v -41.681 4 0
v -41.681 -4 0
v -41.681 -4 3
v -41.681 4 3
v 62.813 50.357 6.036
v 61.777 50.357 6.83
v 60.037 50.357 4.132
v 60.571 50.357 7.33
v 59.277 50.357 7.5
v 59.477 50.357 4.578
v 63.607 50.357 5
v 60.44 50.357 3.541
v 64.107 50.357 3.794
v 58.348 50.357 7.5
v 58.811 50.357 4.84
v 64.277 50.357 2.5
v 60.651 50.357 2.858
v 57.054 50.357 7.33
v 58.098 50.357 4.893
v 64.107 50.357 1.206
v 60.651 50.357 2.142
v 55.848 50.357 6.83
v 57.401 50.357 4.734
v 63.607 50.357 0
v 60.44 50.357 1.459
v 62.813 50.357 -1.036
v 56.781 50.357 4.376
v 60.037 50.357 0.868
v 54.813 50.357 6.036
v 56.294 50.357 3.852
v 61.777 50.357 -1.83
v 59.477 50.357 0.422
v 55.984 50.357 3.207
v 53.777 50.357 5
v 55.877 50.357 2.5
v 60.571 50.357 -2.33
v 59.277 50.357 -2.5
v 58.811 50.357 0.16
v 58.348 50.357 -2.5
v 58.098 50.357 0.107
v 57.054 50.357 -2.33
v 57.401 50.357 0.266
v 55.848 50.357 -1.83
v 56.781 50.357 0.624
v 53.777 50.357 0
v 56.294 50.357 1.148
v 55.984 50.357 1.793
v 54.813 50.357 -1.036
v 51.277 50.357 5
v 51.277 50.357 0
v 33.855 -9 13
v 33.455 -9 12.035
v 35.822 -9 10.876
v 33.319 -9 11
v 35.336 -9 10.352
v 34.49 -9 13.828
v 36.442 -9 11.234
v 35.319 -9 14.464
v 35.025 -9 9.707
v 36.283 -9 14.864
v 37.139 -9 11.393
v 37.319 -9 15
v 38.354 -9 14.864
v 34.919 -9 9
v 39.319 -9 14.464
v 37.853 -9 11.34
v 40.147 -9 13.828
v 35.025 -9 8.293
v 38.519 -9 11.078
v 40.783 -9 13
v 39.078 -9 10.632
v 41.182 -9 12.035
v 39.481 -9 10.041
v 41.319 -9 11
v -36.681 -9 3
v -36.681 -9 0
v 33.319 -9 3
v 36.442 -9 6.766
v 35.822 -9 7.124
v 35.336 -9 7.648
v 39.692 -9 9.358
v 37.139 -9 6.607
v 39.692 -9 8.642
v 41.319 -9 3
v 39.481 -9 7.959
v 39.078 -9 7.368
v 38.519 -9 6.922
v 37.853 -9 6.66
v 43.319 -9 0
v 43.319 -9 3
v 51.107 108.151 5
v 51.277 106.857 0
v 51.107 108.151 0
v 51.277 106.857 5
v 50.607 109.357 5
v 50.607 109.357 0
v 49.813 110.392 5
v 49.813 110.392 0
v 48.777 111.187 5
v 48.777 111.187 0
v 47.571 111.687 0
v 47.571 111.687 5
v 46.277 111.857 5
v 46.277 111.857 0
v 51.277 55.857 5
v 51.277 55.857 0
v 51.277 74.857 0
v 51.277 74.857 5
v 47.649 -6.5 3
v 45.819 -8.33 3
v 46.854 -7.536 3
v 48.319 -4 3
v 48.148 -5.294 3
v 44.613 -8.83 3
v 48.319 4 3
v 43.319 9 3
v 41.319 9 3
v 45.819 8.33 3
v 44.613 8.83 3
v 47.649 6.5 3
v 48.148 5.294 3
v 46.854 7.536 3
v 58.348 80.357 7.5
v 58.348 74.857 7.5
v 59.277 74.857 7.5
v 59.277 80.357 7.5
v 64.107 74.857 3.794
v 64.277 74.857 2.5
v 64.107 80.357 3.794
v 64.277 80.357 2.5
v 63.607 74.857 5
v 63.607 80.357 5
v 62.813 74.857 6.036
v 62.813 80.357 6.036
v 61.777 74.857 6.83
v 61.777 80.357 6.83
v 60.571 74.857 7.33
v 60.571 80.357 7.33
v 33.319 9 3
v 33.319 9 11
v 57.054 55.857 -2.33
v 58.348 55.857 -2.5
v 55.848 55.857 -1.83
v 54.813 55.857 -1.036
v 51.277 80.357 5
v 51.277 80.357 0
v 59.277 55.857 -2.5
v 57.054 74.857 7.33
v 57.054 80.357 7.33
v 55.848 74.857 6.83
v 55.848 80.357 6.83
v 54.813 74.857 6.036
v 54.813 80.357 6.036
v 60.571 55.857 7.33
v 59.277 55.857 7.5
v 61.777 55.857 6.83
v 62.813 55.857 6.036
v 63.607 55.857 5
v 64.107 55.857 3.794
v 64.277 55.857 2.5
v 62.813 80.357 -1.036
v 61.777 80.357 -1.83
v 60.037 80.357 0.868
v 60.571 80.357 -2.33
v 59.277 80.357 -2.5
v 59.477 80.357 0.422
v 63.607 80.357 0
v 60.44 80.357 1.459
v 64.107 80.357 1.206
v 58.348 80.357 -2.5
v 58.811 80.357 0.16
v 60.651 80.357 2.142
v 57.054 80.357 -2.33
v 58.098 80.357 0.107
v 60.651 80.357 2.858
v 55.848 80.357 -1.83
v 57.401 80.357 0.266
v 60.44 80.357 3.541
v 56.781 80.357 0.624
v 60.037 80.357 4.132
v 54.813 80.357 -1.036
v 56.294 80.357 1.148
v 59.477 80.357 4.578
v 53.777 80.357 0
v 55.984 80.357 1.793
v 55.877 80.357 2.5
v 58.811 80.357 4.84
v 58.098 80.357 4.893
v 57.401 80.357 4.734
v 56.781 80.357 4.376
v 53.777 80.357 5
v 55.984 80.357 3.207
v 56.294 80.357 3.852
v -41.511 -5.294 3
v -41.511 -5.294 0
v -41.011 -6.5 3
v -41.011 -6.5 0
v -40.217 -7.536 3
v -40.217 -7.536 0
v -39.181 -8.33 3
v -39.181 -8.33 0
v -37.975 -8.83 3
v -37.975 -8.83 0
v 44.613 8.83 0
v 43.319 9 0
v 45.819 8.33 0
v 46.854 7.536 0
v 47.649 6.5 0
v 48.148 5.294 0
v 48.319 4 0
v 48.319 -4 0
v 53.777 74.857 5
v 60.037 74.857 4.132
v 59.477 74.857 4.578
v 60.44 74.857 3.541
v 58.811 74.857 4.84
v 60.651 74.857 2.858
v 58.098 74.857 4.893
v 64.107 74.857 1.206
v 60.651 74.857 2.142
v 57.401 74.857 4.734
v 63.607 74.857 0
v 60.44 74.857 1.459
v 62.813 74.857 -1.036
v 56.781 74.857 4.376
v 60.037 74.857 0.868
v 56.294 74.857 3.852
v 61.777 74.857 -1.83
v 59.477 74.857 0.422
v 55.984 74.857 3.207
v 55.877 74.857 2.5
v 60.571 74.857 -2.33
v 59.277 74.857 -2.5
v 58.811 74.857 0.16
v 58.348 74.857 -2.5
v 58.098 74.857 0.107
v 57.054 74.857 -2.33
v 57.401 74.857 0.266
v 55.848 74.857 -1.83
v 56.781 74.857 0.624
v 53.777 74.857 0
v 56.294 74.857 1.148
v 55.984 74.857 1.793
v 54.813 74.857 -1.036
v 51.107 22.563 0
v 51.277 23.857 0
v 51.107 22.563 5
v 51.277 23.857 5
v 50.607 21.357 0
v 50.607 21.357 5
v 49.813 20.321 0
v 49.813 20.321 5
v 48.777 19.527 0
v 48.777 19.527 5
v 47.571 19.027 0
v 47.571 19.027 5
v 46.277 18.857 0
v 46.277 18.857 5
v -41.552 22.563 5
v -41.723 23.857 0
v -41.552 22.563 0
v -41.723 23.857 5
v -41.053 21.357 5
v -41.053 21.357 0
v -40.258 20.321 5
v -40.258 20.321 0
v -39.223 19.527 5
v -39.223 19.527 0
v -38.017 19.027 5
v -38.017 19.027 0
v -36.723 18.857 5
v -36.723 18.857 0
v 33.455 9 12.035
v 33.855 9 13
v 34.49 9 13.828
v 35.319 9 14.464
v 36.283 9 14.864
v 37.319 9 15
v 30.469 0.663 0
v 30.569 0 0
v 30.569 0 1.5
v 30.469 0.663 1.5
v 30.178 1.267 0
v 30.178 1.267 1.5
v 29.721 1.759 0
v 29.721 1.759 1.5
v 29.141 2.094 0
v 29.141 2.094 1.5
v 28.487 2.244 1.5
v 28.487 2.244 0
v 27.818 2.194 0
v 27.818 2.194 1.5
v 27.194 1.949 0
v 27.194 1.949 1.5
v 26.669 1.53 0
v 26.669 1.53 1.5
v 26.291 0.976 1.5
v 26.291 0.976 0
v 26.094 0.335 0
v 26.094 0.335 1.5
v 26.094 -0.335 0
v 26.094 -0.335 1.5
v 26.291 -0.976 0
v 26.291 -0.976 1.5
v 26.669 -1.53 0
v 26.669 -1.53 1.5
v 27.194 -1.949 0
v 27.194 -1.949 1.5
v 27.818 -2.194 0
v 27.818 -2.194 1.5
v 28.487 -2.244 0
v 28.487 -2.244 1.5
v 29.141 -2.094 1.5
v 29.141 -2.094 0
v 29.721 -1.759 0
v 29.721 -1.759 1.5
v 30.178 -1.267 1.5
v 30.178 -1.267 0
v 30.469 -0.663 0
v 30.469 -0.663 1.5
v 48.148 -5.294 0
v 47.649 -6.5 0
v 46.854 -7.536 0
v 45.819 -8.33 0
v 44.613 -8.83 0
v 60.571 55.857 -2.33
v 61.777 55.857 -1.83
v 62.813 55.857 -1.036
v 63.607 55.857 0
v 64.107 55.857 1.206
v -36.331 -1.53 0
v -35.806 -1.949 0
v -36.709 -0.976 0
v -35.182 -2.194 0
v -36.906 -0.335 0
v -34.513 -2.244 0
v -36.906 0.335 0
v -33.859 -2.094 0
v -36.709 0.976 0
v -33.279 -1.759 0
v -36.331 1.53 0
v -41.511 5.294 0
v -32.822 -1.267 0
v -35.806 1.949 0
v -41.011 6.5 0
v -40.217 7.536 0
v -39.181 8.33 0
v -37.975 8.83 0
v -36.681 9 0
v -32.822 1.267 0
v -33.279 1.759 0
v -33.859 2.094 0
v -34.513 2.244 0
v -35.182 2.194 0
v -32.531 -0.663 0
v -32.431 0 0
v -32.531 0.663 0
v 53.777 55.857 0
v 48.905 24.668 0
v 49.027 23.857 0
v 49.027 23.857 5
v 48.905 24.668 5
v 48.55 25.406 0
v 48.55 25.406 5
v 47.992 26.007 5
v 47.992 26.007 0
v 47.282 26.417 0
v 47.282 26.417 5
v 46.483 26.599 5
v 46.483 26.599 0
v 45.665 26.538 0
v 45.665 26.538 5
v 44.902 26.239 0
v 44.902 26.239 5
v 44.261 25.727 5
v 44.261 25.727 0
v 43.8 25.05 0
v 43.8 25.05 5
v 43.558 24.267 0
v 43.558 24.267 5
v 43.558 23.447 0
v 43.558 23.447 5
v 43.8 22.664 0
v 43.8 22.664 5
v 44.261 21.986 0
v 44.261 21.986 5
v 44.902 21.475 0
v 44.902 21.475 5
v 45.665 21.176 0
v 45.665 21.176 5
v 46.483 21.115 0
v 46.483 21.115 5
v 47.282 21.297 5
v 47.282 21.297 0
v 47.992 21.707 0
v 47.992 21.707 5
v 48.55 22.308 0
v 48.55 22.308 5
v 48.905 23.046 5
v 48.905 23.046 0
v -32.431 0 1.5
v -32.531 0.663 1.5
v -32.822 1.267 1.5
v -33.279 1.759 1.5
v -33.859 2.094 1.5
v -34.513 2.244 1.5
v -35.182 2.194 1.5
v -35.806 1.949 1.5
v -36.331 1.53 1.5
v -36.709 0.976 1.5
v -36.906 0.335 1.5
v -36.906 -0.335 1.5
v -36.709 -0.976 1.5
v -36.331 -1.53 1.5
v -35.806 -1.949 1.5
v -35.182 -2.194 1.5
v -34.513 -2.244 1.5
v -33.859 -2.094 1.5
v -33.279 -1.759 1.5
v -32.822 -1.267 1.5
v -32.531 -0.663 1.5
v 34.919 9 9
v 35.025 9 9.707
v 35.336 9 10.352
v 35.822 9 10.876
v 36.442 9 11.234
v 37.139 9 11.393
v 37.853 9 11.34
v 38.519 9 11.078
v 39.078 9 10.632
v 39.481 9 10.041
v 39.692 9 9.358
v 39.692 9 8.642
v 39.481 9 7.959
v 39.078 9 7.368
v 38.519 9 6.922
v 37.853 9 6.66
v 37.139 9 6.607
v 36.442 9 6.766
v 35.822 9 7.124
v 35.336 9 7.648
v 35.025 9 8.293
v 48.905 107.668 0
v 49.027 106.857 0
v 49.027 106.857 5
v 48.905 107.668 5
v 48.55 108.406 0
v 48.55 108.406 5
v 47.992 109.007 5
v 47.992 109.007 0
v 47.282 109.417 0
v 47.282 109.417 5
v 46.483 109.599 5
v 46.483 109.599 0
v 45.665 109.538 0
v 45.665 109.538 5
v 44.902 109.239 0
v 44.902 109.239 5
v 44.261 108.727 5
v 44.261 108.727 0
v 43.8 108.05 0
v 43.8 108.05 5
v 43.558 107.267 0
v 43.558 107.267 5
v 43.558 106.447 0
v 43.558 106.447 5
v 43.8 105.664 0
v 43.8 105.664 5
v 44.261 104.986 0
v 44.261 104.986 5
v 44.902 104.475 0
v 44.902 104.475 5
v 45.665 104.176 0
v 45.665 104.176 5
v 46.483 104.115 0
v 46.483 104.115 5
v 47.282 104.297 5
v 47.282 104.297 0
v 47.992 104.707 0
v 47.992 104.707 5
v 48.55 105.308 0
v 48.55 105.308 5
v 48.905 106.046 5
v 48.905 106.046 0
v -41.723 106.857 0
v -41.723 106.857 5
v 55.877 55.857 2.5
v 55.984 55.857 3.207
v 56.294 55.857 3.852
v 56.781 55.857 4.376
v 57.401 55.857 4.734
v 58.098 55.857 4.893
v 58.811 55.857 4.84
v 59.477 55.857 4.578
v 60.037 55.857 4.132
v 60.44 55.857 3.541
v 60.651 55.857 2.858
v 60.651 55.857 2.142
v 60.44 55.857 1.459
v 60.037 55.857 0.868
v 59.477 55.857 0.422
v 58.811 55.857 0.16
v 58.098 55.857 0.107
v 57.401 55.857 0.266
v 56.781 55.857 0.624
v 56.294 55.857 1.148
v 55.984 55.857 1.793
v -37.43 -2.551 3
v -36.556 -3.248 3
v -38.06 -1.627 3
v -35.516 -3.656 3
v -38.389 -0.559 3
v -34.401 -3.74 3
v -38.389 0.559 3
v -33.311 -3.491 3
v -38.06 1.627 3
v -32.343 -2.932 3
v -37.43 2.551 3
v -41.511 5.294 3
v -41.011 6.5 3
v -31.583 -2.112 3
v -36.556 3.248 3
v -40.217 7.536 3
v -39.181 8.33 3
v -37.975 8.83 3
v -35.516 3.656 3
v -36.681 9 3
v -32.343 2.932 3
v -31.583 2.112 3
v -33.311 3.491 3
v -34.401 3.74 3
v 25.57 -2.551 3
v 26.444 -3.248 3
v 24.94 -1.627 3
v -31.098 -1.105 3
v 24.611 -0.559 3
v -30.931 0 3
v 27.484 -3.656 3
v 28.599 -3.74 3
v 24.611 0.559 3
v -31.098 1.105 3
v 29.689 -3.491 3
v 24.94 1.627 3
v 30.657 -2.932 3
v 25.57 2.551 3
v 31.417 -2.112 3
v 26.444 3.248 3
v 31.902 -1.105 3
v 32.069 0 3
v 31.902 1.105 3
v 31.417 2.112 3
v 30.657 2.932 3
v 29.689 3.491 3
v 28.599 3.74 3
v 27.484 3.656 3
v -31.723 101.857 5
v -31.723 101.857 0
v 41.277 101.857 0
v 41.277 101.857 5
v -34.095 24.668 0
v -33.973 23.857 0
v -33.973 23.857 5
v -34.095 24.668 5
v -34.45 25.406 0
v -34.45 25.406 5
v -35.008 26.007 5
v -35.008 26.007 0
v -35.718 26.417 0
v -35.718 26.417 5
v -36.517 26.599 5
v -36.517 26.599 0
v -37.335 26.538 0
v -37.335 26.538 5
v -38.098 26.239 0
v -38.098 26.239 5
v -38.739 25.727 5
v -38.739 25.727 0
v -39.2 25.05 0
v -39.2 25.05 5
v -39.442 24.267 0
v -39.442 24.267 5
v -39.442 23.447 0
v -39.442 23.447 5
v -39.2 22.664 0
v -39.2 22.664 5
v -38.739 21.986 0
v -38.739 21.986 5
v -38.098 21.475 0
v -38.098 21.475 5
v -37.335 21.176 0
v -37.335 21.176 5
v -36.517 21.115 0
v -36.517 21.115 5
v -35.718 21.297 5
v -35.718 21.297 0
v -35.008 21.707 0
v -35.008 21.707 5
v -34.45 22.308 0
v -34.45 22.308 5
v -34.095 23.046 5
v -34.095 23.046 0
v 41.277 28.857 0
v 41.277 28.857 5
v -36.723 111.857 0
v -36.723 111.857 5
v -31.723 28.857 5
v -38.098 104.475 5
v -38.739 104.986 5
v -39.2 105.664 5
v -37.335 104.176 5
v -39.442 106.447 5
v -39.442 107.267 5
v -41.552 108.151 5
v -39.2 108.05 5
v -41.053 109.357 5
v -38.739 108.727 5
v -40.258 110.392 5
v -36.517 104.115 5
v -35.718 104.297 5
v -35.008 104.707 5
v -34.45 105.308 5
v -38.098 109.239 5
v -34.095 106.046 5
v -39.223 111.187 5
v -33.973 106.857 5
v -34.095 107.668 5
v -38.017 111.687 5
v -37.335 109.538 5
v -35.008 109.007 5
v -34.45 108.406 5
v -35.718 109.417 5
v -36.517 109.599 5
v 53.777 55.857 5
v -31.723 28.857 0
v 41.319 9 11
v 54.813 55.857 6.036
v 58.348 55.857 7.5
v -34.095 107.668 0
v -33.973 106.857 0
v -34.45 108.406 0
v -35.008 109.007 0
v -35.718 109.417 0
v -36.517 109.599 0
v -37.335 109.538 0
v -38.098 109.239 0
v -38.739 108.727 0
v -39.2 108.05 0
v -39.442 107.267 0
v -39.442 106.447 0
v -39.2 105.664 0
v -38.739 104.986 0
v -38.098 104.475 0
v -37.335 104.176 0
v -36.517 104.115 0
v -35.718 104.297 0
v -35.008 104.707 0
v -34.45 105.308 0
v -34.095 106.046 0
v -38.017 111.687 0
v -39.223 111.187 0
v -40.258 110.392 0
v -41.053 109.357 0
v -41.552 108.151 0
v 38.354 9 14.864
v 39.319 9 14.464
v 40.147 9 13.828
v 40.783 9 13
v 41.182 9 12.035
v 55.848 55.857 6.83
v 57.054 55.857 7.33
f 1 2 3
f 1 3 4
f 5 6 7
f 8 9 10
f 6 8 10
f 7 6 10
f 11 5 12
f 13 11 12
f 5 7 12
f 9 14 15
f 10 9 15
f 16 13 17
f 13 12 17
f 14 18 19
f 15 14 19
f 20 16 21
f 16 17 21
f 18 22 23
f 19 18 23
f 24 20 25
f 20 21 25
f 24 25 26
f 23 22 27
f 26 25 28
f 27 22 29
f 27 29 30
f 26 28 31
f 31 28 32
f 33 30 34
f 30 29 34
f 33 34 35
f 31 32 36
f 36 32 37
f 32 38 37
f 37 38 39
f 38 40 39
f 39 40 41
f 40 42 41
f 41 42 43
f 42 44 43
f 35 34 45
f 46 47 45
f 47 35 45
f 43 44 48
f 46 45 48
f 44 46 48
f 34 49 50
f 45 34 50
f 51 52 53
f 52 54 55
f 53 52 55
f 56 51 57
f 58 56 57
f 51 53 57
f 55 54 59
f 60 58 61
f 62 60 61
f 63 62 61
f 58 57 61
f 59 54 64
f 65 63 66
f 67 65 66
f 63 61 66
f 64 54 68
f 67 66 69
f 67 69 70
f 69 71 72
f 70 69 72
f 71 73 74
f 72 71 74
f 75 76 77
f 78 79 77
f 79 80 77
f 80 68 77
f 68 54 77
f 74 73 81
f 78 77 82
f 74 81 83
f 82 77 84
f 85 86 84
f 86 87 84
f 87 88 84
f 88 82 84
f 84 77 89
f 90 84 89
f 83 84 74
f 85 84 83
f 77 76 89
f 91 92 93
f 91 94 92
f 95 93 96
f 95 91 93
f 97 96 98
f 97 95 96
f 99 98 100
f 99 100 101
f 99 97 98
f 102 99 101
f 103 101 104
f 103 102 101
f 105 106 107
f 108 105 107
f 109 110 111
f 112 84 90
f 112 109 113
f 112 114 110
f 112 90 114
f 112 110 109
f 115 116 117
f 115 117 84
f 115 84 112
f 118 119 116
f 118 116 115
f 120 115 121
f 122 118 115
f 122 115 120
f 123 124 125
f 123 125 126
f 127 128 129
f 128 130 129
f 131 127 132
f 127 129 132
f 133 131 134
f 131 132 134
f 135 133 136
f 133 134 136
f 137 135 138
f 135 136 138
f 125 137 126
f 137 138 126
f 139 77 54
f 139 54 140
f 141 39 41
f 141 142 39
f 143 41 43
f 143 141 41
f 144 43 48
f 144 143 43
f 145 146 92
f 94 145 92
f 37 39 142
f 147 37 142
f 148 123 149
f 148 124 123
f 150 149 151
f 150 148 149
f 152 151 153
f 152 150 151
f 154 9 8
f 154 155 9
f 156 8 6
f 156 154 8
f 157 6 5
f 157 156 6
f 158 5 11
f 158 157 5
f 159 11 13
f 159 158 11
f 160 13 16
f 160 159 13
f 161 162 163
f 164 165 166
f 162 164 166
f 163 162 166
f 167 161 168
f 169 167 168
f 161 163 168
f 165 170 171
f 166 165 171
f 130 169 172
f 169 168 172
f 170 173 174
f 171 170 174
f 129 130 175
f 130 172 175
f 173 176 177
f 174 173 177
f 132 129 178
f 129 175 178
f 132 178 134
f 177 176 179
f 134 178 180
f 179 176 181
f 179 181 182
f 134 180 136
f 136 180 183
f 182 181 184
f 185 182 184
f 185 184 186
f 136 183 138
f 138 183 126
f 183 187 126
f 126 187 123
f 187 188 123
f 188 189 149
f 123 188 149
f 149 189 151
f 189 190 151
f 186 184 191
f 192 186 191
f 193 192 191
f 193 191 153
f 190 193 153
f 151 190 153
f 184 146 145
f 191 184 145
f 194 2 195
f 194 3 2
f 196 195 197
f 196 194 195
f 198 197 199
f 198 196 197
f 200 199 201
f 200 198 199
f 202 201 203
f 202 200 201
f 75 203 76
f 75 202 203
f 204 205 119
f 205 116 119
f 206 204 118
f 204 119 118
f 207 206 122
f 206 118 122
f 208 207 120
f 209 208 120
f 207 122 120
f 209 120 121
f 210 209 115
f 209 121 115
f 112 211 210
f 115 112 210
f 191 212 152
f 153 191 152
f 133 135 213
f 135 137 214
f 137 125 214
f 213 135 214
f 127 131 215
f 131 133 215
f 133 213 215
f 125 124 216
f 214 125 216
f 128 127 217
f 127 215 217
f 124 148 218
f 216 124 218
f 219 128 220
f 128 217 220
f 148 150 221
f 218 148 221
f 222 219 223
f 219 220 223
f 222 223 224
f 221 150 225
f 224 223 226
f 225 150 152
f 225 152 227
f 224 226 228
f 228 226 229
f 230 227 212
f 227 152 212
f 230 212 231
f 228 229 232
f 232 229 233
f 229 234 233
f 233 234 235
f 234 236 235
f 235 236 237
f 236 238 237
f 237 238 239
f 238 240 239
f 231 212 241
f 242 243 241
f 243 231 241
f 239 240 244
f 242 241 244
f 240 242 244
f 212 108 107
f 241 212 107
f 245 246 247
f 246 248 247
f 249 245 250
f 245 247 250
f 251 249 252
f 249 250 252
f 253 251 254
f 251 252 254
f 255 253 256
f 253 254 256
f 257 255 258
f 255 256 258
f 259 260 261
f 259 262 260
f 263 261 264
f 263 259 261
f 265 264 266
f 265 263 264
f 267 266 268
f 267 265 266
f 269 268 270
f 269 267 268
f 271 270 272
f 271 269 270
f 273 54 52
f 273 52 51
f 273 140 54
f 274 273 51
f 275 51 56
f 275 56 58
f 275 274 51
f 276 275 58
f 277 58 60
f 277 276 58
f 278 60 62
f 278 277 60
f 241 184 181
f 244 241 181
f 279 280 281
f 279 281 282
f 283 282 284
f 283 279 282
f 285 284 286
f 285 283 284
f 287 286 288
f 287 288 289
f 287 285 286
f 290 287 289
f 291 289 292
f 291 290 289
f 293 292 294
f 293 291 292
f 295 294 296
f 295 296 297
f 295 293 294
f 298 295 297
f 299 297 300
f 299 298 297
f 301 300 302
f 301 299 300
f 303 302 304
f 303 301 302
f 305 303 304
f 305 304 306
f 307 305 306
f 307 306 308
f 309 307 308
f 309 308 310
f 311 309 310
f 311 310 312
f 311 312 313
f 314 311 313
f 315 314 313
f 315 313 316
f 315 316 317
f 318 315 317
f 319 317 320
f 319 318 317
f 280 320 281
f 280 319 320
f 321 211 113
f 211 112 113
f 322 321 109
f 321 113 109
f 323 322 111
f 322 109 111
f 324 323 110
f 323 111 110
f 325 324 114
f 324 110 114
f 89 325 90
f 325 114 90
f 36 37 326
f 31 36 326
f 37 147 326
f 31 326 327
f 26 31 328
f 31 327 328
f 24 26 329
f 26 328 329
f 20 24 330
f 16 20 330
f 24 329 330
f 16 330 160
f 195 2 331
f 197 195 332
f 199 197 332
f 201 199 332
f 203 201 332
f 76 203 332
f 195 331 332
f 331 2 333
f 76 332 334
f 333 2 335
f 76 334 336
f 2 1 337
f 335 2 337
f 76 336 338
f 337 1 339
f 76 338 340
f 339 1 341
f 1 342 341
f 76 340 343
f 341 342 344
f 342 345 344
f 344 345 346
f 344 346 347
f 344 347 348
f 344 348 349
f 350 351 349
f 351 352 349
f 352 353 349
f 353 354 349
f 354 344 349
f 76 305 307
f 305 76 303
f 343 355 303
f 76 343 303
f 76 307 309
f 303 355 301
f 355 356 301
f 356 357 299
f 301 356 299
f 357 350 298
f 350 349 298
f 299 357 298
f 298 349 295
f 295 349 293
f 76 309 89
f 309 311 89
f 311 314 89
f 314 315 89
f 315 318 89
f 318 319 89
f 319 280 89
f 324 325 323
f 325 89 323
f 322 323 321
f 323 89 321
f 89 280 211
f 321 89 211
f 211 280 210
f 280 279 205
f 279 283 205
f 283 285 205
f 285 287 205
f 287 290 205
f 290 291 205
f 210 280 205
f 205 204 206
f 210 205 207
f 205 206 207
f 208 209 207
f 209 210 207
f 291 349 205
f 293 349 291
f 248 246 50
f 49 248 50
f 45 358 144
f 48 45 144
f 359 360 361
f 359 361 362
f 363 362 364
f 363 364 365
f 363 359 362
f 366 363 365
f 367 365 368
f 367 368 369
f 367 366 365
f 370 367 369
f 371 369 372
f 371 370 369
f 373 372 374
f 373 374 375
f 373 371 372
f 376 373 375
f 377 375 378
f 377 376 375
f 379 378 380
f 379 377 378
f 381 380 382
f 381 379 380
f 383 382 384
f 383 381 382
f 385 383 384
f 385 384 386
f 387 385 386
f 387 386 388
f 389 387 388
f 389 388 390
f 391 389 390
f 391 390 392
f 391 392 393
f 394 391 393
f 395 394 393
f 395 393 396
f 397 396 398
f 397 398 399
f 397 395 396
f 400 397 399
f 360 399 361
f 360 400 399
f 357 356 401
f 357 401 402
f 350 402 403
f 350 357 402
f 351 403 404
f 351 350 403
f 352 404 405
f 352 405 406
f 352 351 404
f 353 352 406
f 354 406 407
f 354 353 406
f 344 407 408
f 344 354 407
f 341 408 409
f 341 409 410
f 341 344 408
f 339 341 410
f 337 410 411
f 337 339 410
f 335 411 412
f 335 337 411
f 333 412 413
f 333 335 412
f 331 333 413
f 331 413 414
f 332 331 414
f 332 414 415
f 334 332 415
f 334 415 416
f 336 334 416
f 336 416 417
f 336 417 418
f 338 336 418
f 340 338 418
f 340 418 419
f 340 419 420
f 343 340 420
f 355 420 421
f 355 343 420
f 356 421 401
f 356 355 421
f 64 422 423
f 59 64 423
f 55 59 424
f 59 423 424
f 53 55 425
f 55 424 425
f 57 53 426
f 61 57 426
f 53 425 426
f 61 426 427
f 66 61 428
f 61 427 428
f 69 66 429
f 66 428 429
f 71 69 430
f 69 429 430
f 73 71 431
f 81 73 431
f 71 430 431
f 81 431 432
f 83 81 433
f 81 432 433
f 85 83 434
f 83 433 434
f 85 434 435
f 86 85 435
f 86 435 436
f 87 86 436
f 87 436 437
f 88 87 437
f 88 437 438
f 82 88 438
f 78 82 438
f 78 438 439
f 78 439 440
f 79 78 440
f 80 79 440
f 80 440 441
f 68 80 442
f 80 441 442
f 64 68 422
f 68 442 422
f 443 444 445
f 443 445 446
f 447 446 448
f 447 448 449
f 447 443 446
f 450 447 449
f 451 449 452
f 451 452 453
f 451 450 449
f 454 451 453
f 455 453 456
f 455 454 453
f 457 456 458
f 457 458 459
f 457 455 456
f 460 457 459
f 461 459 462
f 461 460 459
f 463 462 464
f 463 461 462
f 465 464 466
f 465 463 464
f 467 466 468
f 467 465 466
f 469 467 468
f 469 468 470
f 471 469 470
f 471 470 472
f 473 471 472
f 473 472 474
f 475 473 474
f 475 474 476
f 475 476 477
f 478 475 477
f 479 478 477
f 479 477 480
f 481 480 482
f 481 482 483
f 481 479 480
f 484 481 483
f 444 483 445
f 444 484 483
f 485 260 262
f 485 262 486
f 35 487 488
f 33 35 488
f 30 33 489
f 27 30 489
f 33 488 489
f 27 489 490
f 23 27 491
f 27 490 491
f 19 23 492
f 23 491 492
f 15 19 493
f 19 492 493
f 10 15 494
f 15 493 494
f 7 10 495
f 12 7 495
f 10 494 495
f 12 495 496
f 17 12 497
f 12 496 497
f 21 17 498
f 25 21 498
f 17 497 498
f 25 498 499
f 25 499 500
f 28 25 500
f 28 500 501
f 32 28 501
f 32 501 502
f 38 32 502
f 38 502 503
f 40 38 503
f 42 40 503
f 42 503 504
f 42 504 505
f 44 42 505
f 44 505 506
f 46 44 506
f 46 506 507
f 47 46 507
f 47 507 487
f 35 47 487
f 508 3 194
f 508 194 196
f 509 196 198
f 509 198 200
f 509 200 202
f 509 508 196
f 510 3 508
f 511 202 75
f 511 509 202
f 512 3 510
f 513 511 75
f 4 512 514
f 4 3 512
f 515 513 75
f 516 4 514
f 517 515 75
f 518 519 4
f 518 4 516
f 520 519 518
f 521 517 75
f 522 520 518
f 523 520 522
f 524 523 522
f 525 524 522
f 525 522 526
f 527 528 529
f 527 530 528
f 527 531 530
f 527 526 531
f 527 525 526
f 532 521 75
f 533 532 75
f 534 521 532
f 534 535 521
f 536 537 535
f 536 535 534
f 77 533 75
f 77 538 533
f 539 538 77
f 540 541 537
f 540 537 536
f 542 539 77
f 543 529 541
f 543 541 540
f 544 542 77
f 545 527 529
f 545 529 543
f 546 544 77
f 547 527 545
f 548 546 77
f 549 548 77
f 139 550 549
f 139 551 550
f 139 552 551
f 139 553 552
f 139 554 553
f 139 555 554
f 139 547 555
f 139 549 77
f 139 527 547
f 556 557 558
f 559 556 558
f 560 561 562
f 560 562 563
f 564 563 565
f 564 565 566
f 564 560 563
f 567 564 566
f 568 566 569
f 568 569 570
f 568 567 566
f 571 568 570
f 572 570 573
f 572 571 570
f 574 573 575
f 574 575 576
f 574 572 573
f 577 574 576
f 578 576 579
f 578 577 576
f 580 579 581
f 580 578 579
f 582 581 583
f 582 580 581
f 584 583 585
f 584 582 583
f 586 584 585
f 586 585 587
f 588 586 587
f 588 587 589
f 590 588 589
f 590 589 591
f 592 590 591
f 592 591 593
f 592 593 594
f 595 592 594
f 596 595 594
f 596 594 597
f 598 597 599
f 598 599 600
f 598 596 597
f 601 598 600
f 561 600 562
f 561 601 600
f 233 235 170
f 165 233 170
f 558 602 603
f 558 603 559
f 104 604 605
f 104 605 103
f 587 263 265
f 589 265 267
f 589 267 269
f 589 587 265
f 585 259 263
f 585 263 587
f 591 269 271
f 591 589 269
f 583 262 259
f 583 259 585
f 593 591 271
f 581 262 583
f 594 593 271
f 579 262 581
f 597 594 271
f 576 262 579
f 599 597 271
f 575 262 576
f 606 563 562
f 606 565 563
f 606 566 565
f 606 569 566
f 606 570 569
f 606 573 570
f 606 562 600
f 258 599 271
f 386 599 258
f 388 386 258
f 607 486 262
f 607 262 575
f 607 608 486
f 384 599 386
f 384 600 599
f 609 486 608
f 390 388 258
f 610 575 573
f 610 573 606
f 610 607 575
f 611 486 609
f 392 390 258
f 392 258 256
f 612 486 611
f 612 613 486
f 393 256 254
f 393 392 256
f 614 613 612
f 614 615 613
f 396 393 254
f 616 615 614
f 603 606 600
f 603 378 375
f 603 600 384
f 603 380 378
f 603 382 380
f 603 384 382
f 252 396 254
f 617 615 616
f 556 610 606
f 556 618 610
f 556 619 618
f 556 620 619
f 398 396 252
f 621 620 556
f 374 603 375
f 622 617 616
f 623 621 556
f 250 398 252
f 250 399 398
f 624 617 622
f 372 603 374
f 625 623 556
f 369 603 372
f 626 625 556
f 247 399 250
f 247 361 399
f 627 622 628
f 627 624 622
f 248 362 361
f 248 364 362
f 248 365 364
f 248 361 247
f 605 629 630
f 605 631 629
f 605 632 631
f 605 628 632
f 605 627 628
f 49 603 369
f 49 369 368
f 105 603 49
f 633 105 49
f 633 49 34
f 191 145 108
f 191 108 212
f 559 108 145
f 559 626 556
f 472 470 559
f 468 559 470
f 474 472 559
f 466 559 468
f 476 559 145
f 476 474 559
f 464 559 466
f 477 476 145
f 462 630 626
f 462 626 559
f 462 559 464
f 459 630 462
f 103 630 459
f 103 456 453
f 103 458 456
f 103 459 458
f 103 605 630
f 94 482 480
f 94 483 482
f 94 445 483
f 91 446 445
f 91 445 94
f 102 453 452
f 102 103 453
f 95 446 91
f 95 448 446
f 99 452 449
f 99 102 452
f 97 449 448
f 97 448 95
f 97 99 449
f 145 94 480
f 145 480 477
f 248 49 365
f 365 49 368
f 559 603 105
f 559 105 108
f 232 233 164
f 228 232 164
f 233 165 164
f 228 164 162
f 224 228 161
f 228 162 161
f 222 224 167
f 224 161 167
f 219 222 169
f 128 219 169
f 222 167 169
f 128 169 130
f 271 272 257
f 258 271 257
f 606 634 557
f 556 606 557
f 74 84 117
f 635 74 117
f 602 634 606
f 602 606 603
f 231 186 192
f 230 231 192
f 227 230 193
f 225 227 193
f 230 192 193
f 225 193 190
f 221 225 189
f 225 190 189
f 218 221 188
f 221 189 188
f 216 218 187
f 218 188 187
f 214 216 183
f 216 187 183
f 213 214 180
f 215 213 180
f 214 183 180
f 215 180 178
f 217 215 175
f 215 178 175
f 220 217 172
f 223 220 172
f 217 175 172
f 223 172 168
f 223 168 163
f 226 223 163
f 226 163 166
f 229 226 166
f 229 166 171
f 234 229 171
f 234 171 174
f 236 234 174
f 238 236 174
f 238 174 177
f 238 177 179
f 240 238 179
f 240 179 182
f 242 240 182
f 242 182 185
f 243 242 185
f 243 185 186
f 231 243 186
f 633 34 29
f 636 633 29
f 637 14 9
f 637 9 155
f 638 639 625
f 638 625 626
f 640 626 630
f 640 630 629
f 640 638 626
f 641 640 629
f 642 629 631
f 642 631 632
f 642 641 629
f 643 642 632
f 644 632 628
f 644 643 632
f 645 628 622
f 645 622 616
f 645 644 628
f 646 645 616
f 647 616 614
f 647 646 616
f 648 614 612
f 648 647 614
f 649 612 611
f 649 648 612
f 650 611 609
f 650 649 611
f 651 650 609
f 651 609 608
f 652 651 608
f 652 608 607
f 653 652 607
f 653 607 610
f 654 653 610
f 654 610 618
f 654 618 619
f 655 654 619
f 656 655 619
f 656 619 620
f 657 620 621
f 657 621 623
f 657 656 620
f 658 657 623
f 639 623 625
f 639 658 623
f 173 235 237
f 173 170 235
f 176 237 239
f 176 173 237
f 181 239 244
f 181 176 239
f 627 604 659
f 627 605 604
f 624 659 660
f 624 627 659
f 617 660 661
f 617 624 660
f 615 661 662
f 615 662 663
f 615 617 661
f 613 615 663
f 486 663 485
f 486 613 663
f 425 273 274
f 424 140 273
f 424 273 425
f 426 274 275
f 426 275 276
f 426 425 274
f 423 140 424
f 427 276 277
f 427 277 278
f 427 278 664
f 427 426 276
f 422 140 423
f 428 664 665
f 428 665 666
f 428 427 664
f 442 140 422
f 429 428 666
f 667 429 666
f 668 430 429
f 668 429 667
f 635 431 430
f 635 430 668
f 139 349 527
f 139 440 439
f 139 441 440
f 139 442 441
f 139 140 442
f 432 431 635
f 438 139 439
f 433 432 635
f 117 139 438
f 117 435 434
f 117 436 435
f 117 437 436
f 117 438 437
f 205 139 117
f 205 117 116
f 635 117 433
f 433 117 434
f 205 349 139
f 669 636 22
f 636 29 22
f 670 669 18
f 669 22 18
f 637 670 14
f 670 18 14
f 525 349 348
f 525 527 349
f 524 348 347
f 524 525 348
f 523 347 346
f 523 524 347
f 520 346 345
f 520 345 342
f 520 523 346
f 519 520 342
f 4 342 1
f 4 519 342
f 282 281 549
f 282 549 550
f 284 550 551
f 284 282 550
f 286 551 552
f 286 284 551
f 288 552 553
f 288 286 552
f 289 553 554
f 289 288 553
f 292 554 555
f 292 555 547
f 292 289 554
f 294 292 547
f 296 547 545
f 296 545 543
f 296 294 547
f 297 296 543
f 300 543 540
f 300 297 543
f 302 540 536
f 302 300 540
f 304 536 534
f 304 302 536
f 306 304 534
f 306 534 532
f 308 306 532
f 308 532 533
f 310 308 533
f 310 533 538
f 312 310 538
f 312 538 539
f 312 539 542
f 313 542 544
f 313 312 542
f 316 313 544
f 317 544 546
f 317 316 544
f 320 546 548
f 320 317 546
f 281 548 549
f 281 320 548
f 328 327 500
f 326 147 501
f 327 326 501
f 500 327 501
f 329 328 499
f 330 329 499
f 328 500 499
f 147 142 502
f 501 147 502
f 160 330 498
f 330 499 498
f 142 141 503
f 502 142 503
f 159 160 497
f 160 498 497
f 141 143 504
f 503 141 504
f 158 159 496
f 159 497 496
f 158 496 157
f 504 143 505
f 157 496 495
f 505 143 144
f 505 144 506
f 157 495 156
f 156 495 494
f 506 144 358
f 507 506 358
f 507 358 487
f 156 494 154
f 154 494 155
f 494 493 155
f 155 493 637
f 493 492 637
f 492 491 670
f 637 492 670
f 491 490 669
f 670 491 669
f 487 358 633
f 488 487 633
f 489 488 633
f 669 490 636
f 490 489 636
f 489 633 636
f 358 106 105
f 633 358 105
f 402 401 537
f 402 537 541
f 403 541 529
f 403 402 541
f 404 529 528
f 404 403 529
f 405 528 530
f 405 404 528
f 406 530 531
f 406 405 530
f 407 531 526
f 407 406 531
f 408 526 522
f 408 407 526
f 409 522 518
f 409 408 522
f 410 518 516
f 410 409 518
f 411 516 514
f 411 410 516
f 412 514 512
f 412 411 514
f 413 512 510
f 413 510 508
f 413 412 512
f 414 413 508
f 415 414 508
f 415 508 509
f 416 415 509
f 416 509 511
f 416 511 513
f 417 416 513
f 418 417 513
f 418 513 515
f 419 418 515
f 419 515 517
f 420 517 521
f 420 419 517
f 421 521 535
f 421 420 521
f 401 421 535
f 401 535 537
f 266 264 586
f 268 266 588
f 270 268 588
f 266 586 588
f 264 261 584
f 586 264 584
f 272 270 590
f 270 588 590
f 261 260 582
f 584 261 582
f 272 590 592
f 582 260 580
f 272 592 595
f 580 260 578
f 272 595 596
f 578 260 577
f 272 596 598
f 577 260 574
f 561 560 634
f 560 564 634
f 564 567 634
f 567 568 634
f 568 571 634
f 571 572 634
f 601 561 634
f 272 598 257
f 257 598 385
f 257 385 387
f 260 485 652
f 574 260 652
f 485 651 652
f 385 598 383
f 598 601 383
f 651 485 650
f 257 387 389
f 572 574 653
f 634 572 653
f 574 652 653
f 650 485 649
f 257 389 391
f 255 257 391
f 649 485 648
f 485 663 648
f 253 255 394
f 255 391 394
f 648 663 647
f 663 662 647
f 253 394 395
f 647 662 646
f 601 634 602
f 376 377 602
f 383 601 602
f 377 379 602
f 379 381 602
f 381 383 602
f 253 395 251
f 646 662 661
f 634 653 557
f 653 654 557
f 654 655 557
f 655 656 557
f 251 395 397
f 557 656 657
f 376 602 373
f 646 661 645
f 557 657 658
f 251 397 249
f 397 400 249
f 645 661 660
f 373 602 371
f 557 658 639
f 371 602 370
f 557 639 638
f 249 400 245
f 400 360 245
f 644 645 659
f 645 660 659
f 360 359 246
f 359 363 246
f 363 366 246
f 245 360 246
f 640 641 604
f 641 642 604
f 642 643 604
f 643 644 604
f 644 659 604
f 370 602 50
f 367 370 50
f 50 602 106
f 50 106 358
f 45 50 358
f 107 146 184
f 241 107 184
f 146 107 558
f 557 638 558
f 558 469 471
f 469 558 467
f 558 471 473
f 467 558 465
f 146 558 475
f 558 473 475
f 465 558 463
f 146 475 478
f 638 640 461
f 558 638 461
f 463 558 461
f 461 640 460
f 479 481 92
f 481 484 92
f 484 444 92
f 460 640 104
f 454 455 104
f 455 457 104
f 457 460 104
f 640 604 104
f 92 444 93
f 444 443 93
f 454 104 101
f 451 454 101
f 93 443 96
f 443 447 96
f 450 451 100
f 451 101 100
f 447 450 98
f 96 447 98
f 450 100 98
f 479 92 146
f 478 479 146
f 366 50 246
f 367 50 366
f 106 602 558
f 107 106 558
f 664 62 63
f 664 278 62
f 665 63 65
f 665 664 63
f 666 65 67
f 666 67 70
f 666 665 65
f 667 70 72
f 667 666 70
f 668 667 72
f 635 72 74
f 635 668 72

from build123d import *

# Parameters (mm, degrees)
F0_W          = 90
F0_H          = 18
F0_R          = 2.25
F1_DEPTH      = 3
F2_W          = 8
F2_H          = 18
F3_DEPTH      = 12
F4_R          = 2.4
F5_DEPTH      = 18
F6_SIZE       = 1.5
F7_W          = 93
F7_H          = 93
F7_R          = 2.75
F7_W_2        = 73
F7_H_2        = 73
F8_DEPTH      = 5
F9_W          = 5.5
F9_H          = 5
F9_H_2        = 2.5
F10_DEPTH     = 13
F11_R         = 2.4
F12_DEPTH     = 89.3579660494
F13_T4_DEPTH  = 31.2168298797
F13_T9_DEPTH  = 31.2168298797
F13_T14_DEPTH = 31.2168298797
F13_T19_DEPTH = 31.2168298797
F14_R         = 4.99999
F15_R         = 5
F16_R         = 3.99999
F17_R         = 5


# Not quite as in the source:
# - a fillet or chamfer that OpenCascade refuses, or shapes differently, is made with other operations: its cross-section is extruded or revolved along the edge and cut away or added
# - a fillet or chamfer is up to 0.001 mm smaller than in the source, because OpenCascade refuses the exact size


with BuildPart() as f1:
    # F0 (on Top) → F1 (new body)
    with BuildSketch(Plane.XY):
        with Locations((3.3186358213, 0)):
            Rectangle(F0_W, F0_H)
        with Locations((-34.6813641787, 0)):
            Circle(F0_R, mode=Mode.SUBTRACT)
        with Locations((28.3186358213, 0)):
            Circle(F0_R, mode=Mode.SUBTRACT)
    extrude(amount=F1_DEPTH)

    # F2 (on face) → F3 (join)
    with BuildSketch(Plane.XY.offset(3)):
        with Locations((37.3186358213, 0)):
            Rectangle(F2_W, F2_H)
    extrude(amount=F3_DEPTH)

    # F4 (on face) → F5 (cut, through all)
    with BuildSketch(Plane(origin=(0, 9, 0), x_dir=(-1, 0, 0), z_dir=(0, 1, 0))):
        with Locations((-37.3186358213, 9)):
            Circle(F4_R)
    extrude(amount=-F5_DEPTH, mode=Mode.SUBTRACT)

    # F6
    f6_edges = [f1.edges().sort_by_distance(p)[0] for p in [
        (-36.931364, 0, 3),
        (26.068636, 0, 3),
    ]]
    chamfer(f6_edges, length=F6_SIZE)

    # F16 (radius 4 in the source; OpenCascade refuses exactly that, so slightly less here)
    f16_edges = [f1.edges().sort_by_distance(p)[0] for p in [
        (41.318636, 0, 15),
        (33.318636, 0, 15),
    ]]
    fillet(f16_edges, radius=F16_R)

    # F17
    f17_edges = [f1.edges().sort_by_distance(p)[0] for p in [
        (-41.681364, -9, 1.5),
        (-41.681364, 9, 1.5),
        (48.318636, -9, 1.5),
        (48.318636, 9, 1.5),
    ]]
    fillet(f17_edges, radius=F17_R)


with BuildPart() as f8:
    # F7 (on Top) → F8 (new body)
    with BuildSketch(Plane.XY):
        with Locations((4.7773654461, 65.3569660494)):
            Rectangle(F7_W, F7_H)
        with Locations((-36.7226345539, 23.8569660494)):
            Circle(F7_R, mode=Mode.SUBTRACT)
        with Locations((46.2773654461, 23.8569660494)):
            Circle(F7_R, mode=Mode.SUBTRACT)
        with Locations((4.7773654461, 65.3569660494)):
            Rectangle(F7_W_2, F7_H_2, mode=Mode.SUBTRACT)
        with Locations((-36.7226345539, 106.8569660494)):
            Circle(F7_R, mode=Mode.SUBTRACT)
        with Locations((46.2773654461, 106.8569660494)):
            Circle(F7_R, mode=Mode.SUBTRACT)
    extrude(amount=F8_DEPTH)

    # F9 (on face) → F10 (join)
    with BuildSketch(Plane.YZ.offset(51.2773654461)):
        with Locations((53.1069660494, 2.5)):
            Rectangle(F9_W, F9_H)
        with Locations((53.1069660494, -1.25)):
            Rectangle(F9_W, F9_H_2)
        with Locations((77.6069660494, 6.25)):
            Rectangle(F9_W, F9_H_2)
        with Locations((77.6069660494, -1.25)):
            Rectangle(F9_W, F9_H_2)
        with Locations((77.6069660494, 2.5)):
            Rectangle(F9_W, F9_H)
        with Locations((53.1069660494, 6.25)):
            Rectangle(F9_W, F9_H_2)
    extrude(amount=F10_DEPTH)

    # F11 (on face) → F12 (cut, through all)
    with BuildSketch(Plane(origin=(0, 80.3569660494, 0), x_dir=(-1, 0, 0), z_dir=(0, 1, 0))):
        with Locations((-58.2773654461, 2.5)):
            Circle(F11_R)
    extrude(amount=-F12_DEPTH, mode=Mode.SUBTRACT)

    # F13: chamfer of 5 on 4 edges, made by hand


with BuildPart() as f13_tool2:
    # F13_s3 → F13_t4 (new body)
    with BuildSketch(Plane.XZ.offset(-68.7153809892)):
        Polygon((51.2773654461, 2.5), (56.2773654461, 7.5), (51.2773654461, 7.5), align=None)
    extrude(amount=F13_T4_DEPTH)

    split(bisect_by=Plane.XY.offset(5), keep=Keep.TOP)


with BuildPart() as f8_1:
    add(f8.part)

    # F13_t1: cut F13_tool2
    add(f13_tool2.part, mode=Mode.SUBTRACT)


with BuildPart() as f13_tool7:
    # F13_s8 → F13_t9 (new body)
    with BuildSketch(Plane.XZ.offset(-93.2153809892)):
        Polygon((51.2773654461, 2.5), (56.2773654461, 7.5), (51.2773654461, 7.5), align=None)
    extrude(amount=F13_T9_DEPTH)

    split(bisect_by=Plane.XY.offset(5), keep=Keep.TOP)


with BuildPart() as f8_2:
    add(f8_1.part)

    # F13_t6: cut F13_tool7
    add(f13_tool7.part, mode=Mode.SUBTRACT)


with BuildPart() as f13_tool12:
    # F13_s13 → F13_t14 (new body)
    with BuildSketch(Plane.XZ.offset(-37.4985511096)):
        Polygon((51.2773654461, 2.5), (56.2773654461, -2.5), (51.2773654461, -2.5), align=None)
    extrude(amount=-F13_T14_DEPTH)

    split(bisect_by=Plane.XY, keep=Keep.BOTTOM)


with BuildPart() as f8_3:
    add(f8_2.part)

    # F13_t11: cut F13_tool12
    add(f13_tool12.part, mode=Mode.SUBTRACT)


with BuildPart() as f13_tool17:
    # F13_s18 → F13_t19 (new body)
    with BuildSketch(Plane.XZ.offset(-61.9985511096)):
        Polygon((51.2773654461, 2.5), (56.2773654461, -2.5), (51.2773654461, -2.5), align=None)
    extrude(amount=-F13_T19_DEPTH)

    split(bisect_by=Plane.XY, keep=Keep.BOTTOM)


with BuildPart() as f8_4:
    add(f8_3.part)

    # F13_t16: cut F13_tool17
    add(f13_tool17.part, mode=Mode.SUBTRACT)

    # F14 (radius 5 in the source; OpenCascade refuses exactly that, so slightly less here)
    f14_edges = [f8_4.edges().sort_by_distance(p)[0] for p in [
        (64.277365, 53.106966, 7.5),
        (64.277365, 77.606966, 7.5),
        (64.277365, 77.606966, -2.5),
        (64.277365, 53.106966, -2.5),
        (56.277365, 53.106966, 7.5),
        (56.277365, 53.106966, -2.5),
        (56.277365, 77.606966, -2.5),
        (56.277365, 77.606966, 7.5),
    ]]
    fillet(f14_edges, radius=F14_R)

    # F15
    f15_edges = [f8_4.edges().sort_by_distance(p)[0] for p in [
        (51.277365, 18.856966, 2.5),
        (51.277365, 111.856966, 2.5),
        (-41.722635, 111.856966, 2.5),
        (-41.722635, 18.856966, 2.5),
    ]]
    fillet(f15_edges, radius=F15_R)


solid = Compound([f1.part, f8_4.part])
